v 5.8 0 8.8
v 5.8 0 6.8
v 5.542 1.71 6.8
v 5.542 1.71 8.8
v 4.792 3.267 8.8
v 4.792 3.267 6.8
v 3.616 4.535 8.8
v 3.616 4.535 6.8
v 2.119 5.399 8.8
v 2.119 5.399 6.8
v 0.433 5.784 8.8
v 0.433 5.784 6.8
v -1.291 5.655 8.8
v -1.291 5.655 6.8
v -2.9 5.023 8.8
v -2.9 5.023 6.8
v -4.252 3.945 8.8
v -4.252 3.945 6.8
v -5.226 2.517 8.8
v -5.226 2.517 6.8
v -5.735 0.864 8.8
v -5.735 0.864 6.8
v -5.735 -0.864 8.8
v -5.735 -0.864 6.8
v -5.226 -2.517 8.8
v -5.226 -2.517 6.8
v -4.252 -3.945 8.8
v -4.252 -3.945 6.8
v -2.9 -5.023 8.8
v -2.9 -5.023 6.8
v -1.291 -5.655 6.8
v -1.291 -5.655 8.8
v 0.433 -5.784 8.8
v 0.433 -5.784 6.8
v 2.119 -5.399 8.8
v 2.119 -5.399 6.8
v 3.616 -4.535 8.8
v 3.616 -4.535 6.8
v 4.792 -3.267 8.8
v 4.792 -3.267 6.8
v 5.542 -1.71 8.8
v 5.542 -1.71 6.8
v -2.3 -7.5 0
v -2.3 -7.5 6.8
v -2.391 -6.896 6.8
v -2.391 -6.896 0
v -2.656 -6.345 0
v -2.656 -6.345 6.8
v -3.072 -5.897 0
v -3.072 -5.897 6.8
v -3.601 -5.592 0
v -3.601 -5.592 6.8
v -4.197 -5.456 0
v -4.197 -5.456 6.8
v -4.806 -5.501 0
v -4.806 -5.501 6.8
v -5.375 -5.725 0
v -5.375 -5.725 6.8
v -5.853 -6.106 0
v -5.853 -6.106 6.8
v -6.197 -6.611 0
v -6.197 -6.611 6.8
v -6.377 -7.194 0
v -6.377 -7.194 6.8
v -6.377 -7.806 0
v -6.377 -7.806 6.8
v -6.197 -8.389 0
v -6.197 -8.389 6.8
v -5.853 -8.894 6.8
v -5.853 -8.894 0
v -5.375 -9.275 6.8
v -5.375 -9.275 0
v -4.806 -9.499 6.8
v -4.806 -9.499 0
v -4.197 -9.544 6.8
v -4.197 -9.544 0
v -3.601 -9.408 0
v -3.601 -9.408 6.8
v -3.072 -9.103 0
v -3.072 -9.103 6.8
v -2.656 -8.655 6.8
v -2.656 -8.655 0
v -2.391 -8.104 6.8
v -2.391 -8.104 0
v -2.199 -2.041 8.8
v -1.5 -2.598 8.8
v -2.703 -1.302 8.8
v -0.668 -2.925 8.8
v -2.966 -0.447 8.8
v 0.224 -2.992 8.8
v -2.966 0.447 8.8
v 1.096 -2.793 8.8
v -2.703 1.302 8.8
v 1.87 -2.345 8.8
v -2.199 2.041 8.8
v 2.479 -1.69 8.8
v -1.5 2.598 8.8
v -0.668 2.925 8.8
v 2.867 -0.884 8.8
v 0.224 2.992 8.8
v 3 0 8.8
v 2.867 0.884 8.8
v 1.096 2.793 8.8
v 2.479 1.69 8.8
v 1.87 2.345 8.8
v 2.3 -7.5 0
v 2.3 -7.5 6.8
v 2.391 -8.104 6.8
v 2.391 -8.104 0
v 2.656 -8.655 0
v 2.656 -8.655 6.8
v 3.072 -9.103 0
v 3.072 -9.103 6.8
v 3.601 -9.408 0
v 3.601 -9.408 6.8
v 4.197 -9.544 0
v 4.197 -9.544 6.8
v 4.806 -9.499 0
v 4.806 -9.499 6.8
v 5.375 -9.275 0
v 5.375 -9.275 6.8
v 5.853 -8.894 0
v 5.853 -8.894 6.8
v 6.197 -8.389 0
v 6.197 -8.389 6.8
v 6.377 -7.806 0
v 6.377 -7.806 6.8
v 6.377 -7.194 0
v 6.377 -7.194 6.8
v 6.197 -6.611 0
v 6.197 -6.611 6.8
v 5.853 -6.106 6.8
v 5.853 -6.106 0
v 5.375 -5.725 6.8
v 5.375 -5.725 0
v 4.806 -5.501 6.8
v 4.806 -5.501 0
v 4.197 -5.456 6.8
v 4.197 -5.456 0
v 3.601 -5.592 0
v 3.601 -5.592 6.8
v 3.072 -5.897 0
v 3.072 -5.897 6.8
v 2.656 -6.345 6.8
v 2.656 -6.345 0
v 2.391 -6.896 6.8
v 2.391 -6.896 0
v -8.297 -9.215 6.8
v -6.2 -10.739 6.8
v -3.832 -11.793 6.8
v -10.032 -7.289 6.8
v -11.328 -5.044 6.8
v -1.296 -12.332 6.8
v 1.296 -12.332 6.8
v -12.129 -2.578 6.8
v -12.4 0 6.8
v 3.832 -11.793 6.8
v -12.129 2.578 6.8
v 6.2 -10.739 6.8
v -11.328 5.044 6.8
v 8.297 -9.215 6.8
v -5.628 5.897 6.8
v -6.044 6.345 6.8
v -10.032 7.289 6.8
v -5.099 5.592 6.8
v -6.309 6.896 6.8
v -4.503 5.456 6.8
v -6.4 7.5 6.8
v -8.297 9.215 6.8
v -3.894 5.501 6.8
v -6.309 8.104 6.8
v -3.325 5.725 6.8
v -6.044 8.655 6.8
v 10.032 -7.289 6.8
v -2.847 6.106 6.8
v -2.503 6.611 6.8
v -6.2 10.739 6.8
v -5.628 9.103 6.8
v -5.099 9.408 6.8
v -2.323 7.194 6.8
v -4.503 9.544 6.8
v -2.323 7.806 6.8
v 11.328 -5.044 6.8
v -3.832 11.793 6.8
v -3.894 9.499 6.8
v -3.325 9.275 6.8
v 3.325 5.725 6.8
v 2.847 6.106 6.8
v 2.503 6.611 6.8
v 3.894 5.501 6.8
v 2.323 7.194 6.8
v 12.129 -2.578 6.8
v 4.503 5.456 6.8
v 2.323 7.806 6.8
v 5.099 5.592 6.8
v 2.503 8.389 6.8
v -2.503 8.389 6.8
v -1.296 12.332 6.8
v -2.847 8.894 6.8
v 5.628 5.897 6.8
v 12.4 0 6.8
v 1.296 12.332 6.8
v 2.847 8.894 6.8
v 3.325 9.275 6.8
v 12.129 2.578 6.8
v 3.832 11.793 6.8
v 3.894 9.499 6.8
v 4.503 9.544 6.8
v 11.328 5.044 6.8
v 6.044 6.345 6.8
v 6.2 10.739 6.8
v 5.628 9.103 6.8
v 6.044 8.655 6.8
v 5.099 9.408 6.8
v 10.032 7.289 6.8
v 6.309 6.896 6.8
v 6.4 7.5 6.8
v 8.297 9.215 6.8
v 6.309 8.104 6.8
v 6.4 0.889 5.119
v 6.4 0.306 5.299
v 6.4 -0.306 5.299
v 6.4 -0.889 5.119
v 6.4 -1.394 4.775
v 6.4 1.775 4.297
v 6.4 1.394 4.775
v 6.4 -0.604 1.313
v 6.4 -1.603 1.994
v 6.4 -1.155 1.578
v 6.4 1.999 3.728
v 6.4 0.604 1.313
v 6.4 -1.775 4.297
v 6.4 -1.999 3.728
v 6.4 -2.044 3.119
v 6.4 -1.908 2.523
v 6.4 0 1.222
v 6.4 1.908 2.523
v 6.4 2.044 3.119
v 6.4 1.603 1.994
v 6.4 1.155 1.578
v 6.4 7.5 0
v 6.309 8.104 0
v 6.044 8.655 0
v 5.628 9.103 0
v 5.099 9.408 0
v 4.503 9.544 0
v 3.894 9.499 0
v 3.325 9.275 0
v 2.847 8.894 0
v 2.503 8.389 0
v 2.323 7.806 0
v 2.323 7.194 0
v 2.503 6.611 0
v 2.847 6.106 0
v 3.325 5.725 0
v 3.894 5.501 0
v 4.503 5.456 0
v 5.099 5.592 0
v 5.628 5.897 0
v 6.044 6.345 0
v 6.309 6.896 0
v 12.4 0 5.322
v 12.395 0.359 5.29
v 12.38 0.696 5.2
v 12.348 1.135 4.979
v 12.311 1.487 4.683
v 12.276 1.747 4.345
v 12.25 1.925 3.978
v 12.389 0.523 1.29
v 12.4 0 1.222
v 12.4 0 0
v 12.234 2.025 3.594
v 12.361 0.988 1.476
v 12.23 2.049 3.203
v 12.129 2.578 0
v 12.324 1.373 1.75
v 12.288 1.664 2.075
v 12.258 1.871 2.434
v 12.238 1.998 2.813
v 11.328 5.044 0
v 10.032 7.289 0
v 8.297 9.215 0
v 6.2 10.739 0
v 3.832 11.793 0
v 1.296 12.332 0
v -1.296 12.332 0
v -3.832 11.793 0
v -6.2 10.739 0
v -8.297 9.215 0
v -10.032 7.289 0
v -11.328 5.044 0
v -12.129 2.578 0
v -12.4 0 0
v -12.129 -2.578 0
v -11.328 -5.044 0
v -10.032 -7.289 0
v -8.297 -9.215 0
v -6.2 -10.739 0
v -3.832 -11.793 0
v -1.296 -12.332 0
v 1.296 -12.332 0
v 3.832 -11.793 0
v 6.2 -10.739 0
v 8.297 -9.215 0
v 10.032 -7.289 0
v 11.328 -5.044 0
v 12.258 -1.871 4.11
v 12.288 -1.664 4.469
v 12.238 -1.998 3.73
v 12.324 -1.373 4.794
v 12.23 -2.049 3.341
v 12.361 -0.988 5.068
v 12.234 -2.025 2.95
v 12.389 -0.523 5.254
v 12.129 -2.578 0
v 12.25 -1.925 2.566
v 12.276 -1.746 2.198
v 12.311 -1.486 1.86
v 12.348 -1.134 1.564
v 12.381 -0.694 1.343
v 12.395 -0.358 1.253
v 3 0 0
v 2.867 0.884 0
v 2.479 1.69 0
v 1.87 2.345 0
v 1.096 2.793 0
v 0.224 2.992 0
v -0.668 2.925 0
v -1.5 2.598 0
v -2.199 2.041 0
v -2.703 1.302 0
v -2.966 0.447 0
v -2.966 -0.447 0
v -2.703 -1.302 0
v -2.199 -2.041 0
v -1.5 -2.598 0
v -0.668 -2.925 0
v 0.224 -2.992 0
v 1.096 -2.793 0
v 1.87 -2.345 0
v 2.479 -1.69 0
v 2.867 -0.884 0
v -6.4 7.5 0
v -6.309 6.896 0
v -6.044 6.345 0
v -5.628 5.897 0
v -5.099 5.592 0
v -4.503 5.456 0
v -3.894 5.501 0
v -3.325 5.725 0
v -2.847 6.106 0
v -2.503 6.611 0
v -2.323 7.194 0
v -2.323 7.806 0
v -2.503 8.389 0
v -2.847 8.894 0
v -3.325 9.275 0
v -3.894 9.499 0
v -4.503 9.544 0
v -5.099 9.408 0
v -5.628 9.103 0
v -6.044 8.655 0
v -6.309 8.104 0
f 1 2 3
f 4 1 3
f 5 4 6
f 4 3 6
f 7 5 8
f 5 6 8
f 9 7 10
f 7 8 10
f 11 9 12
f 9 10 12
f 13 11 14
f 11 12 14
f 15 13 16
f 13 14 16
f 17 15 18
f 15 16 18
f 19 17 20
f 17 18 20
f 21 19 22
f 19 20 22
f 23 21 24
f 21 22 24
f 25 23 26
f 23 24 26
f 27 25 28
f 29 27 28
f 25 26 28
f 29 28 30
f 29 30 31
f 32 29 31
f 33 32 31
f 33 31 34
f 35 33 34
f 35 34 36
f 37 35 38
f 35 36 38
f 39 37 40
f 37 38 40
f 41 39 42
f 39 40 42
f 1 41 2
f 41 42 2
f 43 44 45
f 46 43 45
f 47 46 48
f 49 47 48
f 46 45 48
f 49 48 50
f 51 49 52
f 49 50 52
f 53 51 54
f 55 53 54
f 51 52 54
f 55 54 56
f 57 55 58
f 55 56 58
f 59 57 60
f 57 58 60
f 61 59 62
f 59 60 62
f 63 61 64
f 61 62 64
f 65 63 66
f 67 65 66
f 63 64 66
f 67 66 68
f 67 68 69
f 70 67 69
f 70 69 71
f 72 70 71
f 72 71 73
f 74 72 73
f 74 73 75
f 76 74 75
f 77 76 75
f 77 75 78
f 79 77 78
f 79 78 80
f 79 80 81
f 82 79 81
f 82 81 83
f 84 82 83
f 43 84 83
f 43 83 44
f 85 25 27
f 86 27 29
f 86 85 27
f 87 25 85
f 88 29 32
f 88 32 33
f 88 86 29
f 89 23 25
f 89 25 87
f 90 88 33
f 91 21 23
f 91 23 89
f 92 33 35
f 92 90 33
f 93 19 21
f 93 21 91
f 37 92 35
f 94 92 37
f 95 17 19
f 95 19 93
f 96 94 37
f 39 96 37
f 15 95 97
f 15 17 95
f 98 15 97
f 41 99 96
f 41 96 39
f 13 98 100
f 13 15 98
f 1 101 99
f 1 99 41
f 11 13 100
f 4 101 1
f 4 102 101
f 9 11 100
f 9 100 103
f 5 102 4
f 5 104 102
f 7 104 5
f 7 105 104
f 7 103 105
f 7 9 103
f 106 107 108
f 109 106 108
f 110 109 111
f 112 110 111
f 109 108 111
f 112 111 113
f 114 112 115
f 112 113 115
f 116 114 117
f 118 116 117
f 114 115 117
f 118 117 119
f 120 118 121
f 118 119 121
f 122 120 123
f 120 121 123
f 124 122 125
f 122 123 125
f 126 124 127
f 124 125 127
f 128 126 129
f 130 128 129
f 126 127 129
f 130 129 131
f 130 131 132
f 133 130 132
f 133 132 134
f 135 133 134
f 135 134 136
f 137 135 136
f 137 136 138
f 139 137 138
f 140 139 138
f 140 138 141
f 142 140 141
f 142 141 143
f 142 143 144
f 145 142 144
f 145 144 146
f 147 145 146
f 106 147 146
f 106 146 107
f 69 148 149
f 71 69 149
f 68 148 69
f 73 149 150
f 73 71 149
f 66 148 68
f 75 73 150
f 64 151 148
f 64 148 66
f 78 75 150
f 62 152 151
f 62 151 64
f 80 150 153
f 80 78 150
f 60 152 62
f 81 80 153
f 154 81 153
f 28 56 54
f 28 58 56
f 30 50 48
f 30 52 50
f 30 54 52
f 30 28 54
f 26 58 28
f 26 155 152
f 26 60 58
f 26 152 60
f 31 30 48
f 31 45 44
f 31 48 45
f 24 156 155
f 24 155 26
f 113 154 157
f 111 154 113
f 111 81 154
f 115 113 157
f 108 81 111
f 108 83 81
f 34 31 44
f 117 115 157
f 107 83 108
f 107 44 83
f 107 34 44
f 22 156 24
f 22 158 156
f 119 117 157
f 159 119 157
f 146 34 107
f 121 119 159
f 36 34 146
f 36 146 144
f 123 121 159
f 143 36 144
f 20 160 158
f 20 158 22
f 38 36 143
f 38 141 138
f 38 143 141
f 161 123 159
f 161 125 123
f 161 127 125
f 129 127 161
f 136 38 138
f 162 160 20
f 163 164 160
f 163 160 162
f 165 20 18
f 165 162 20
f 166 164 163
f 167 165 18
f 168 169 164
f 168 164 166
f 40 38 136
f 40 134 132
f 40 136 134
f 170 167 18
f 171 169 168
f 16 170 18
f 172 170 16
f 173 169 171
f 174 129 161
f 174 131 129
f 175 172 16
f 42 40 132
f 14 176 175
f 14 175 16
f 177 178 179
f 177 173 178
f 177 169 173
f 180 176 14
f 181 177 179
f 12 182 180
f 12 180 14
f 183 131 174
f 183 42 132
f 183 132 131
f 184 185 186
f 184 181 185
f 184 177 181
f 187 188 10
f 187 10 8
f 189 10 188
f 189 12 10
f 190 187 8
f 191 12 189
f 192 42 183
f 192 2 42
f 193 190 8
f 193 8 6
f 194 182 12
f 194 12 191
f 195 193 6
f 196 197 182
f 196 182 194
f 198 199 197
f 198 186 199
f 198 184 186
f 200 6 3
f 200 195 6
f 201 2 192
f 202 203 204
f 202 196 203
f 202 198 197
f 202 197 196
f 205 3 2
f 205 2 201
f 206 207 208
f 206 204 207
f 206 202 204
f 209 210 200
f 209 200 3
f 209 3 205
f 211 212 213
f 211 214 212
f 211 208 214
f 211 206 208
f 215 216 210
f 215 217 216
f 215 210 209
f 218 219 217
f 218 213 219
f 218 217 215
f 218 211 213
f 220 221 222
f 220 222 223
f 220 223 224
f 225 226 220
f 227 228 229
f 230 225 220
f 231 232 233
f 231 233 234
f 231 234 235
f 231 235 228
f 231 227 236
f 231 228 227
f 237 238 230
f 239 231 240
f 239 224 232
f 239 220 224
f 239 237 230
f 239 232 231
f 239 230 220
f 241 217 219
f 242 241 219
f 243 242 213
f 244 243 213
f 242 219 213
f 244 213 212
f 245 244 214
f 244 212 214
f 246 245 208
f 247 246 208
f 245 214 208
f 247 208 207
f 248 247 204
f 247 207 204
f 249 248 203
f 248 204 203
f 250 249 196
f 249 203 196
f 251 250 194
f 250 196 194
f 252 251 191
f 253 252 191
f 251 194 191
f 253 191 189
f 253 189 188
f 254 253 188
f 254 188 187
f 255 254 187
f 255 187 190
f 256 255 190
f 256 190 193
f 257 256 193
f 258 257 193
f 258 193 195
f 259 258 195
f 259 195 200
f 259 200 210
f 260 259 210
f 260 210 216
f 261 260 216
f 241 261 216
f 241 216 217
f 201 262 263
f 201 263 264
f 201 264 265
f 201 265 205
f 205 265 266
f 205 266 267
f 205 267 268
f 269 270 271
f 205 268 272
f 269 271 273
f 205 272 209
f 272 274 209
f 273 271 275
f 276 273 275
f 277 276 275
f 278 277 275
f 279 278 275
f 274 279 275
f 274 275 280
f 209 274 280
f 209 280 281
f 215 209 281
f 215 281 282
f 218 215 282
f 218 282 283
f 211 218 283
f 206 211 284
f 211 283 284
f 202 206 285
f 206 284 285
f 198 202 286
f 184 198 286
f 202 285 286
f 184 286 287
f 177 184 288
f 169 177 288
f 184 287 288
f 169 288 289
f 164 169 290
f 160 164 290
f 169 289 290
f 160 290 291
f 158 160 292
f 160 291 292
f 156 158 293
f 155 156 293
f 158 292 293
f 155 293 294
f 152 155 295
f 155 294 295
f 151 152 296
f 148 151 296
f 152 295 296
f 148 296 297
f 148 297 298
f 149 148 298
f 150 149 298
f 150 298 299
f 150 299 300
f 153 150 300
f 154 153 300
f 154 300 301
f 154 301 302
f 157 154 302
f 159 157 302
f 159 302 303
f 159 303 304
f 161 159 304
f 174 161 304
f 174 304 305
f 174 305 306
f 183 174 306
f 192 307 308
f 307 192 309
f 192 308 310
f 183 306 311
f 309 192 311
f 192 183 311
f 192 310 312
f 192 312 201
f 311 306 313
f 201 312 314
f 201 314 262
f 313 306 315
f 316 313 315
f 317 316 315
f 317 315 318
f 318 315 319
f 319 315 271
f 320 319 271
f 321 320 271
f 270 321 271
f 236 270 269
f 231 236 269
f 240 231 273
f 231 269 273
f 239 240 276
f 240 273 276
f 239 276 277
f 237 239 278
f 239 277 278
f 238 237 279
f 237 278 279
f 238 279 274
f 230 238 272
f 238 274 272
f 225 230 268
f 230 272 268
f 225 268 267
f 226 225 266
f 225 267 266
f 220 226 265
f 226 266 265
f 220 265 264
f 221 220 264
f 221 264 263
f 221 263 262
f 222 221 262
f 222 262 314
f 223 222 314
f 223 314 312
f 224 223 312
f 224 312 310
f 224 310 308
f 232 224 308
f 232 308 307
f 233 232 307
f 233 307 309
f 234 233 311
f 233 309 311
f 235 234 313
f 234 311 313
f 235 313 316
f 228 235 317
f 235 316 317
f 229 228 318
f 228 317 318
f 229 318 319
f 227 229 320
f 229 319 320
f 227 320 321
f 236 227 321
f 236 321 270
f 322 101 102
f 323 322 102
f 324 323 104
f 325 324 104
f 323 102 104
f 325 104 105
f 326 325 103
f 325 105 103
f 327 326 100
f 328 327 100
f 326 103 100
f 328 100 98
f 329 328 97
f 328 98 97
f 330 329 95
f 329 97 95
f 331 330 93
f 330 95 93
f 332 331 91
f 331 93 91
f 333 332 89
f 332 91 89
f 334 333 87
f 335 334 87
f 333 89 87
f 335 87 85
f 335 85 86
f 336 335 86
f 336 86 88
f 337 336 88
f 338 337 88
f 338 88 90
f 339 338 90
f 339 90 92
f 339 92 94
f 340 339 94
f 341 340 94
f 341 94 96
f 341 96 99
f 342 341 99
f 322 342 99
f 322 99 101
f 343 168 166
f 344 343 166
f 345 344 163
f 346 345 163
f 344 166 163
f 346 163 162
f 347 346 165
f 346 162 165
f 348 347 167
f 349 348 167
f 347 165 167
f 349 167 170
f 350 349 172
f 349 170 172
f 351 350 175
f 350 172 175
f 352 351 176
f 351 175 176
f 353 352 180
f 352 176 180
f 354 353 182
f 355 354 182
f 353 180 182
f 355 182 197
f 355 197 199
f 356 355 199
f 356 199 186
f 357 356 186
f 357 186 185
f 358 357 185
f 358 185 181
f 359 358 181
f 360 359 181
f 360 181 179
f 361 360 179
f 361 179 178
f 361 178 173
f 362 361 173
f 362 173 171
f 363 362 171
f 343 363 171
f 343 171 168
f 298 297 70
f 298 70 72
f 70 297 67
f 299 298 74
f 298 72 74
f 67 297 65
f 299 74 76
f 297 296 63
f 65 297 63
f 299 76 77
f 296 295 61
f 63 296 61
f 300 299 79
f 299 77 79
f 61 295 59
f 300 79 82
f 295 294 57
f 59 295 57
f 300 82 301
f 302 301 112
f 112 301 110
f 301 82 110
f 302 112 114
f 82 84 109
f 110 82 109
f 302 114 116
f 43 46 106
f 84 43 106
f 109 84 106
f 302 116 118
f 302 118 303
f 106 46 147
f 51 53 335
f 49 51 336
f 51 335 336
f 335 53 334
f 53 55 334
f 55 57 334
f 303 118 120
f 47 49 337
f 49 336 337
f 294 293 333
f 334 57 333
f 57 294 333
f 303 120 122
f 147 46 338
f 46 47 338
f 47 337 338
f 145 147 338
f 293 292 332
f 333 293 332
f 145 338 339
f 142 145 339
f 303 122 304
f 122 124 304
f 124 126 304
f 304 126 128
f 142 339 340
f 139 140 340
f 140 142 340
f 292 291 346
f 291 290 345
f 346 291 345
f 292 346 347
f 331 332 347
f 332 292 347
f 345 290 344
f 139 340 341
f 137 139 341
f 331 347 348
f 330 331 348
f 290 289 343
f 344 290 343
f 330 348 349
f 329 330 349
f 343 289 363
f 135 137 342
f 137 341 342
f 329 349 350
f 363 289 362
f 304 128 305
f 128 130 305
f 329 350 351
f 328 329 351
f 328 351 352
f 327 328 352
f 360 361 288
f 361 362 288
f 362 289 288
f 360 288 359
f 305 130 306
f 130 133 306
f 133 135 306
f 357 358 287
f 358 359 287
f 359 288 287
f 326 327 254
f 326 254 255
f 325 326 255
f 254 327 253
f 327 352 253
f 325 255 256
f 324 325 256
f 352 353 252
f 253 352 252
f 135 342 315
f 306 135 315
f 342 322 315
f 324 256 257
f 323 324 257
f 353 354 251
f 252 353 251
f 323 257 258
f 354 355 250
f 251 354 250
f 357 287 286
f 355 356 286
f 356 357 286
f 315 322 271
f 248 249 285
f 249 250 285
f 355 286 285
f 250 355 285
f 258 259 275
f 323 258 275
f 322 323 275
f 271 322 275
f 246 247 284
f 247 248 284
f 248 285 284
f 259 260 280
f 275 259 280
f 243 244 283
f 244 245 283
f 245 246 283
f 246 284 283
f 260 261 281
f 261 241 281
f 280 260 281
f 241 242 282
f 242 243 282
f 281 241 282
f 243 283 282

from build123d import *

# Parameters (mm, degrees)
SKETCH1_R           = 12.4
BOSS_EXTRUDE1_DEPTH = 6.8
SKETCH2_R           = 5.8
BOSS_EXTRUDE2_DEPTH = 2
SKETCH3_R           = 3
CUT_EXTRUDE1_DEPTH  = 20.620397549
SKETCH4_R           = 2.05
CUT_EXTRUDE2_DEPTH  = 19.808508713
SKETCH5_R           = 2.05
CUT_EXTRUDE3_DEPTH  = 6


with BuildPart() as part:
    # Sketch1 → Boss-Extrude1 (new body)
    with BuildSketch(Plane.XY):
        Circle(SKETCH1_R)
    extrude(amount=BOSS_EXTRUDE1_DEPTH)

    # Sketch2 → Boss-Extrude2 (add)
    with BuildSketch(Plane.XY.offset(6.8)):
        Circle(SKETCH2_R)
    extrude(amount=BOSS_EXTRUDE2_DEPTH)

    # Sketch3 → Cut-Extrude1 (cut, through all)
    with BuildSketch(Plane.XY.offset(8.8)):
        Circle(SKETCH3_R)
    extrude(amount=-CUT_EXTRUDE1_DEPTH, mode=Mode.SUBTRACT)

    # Sketch4 → Cut-Extrude2 (cut, through all)
    with BuildSketch(Plane.XY.offset(6.8)):
        with Locations((4.35, 7.5)):
            Circle(SKETCH4_R)
        with Locations(Location((-4.35, 7.5, 0), (0, 0, 180))):
            Circle(SKETCH4_R)
        with Locations(Location((4.35, -7.5, 0), (0, 0, 180))):
            Circle(SKETCH4_R)
        with Locations((-4.35, -7.5)):
            Circle(SKETCH4_R)
    extrude(amount=-CUT_EXTRUDE2_DEPTH, mode=Mode.SUBTRACT)

    # Sketch5 → Cut-Extrude3 (cut)
    with BuildSketch(Plane(origin=(12.4, 0, 0), x_dir=(0, 0, -1), z_dir=(1, 0, 0))):
        with Locations((-3.271849547, 0)):
            Circle(SKETCH5_R)
    extrude(amount=-CUT_EXTRUDE3_DEPTH, mode=Mode.SUBTRACT)


solid = part.part
